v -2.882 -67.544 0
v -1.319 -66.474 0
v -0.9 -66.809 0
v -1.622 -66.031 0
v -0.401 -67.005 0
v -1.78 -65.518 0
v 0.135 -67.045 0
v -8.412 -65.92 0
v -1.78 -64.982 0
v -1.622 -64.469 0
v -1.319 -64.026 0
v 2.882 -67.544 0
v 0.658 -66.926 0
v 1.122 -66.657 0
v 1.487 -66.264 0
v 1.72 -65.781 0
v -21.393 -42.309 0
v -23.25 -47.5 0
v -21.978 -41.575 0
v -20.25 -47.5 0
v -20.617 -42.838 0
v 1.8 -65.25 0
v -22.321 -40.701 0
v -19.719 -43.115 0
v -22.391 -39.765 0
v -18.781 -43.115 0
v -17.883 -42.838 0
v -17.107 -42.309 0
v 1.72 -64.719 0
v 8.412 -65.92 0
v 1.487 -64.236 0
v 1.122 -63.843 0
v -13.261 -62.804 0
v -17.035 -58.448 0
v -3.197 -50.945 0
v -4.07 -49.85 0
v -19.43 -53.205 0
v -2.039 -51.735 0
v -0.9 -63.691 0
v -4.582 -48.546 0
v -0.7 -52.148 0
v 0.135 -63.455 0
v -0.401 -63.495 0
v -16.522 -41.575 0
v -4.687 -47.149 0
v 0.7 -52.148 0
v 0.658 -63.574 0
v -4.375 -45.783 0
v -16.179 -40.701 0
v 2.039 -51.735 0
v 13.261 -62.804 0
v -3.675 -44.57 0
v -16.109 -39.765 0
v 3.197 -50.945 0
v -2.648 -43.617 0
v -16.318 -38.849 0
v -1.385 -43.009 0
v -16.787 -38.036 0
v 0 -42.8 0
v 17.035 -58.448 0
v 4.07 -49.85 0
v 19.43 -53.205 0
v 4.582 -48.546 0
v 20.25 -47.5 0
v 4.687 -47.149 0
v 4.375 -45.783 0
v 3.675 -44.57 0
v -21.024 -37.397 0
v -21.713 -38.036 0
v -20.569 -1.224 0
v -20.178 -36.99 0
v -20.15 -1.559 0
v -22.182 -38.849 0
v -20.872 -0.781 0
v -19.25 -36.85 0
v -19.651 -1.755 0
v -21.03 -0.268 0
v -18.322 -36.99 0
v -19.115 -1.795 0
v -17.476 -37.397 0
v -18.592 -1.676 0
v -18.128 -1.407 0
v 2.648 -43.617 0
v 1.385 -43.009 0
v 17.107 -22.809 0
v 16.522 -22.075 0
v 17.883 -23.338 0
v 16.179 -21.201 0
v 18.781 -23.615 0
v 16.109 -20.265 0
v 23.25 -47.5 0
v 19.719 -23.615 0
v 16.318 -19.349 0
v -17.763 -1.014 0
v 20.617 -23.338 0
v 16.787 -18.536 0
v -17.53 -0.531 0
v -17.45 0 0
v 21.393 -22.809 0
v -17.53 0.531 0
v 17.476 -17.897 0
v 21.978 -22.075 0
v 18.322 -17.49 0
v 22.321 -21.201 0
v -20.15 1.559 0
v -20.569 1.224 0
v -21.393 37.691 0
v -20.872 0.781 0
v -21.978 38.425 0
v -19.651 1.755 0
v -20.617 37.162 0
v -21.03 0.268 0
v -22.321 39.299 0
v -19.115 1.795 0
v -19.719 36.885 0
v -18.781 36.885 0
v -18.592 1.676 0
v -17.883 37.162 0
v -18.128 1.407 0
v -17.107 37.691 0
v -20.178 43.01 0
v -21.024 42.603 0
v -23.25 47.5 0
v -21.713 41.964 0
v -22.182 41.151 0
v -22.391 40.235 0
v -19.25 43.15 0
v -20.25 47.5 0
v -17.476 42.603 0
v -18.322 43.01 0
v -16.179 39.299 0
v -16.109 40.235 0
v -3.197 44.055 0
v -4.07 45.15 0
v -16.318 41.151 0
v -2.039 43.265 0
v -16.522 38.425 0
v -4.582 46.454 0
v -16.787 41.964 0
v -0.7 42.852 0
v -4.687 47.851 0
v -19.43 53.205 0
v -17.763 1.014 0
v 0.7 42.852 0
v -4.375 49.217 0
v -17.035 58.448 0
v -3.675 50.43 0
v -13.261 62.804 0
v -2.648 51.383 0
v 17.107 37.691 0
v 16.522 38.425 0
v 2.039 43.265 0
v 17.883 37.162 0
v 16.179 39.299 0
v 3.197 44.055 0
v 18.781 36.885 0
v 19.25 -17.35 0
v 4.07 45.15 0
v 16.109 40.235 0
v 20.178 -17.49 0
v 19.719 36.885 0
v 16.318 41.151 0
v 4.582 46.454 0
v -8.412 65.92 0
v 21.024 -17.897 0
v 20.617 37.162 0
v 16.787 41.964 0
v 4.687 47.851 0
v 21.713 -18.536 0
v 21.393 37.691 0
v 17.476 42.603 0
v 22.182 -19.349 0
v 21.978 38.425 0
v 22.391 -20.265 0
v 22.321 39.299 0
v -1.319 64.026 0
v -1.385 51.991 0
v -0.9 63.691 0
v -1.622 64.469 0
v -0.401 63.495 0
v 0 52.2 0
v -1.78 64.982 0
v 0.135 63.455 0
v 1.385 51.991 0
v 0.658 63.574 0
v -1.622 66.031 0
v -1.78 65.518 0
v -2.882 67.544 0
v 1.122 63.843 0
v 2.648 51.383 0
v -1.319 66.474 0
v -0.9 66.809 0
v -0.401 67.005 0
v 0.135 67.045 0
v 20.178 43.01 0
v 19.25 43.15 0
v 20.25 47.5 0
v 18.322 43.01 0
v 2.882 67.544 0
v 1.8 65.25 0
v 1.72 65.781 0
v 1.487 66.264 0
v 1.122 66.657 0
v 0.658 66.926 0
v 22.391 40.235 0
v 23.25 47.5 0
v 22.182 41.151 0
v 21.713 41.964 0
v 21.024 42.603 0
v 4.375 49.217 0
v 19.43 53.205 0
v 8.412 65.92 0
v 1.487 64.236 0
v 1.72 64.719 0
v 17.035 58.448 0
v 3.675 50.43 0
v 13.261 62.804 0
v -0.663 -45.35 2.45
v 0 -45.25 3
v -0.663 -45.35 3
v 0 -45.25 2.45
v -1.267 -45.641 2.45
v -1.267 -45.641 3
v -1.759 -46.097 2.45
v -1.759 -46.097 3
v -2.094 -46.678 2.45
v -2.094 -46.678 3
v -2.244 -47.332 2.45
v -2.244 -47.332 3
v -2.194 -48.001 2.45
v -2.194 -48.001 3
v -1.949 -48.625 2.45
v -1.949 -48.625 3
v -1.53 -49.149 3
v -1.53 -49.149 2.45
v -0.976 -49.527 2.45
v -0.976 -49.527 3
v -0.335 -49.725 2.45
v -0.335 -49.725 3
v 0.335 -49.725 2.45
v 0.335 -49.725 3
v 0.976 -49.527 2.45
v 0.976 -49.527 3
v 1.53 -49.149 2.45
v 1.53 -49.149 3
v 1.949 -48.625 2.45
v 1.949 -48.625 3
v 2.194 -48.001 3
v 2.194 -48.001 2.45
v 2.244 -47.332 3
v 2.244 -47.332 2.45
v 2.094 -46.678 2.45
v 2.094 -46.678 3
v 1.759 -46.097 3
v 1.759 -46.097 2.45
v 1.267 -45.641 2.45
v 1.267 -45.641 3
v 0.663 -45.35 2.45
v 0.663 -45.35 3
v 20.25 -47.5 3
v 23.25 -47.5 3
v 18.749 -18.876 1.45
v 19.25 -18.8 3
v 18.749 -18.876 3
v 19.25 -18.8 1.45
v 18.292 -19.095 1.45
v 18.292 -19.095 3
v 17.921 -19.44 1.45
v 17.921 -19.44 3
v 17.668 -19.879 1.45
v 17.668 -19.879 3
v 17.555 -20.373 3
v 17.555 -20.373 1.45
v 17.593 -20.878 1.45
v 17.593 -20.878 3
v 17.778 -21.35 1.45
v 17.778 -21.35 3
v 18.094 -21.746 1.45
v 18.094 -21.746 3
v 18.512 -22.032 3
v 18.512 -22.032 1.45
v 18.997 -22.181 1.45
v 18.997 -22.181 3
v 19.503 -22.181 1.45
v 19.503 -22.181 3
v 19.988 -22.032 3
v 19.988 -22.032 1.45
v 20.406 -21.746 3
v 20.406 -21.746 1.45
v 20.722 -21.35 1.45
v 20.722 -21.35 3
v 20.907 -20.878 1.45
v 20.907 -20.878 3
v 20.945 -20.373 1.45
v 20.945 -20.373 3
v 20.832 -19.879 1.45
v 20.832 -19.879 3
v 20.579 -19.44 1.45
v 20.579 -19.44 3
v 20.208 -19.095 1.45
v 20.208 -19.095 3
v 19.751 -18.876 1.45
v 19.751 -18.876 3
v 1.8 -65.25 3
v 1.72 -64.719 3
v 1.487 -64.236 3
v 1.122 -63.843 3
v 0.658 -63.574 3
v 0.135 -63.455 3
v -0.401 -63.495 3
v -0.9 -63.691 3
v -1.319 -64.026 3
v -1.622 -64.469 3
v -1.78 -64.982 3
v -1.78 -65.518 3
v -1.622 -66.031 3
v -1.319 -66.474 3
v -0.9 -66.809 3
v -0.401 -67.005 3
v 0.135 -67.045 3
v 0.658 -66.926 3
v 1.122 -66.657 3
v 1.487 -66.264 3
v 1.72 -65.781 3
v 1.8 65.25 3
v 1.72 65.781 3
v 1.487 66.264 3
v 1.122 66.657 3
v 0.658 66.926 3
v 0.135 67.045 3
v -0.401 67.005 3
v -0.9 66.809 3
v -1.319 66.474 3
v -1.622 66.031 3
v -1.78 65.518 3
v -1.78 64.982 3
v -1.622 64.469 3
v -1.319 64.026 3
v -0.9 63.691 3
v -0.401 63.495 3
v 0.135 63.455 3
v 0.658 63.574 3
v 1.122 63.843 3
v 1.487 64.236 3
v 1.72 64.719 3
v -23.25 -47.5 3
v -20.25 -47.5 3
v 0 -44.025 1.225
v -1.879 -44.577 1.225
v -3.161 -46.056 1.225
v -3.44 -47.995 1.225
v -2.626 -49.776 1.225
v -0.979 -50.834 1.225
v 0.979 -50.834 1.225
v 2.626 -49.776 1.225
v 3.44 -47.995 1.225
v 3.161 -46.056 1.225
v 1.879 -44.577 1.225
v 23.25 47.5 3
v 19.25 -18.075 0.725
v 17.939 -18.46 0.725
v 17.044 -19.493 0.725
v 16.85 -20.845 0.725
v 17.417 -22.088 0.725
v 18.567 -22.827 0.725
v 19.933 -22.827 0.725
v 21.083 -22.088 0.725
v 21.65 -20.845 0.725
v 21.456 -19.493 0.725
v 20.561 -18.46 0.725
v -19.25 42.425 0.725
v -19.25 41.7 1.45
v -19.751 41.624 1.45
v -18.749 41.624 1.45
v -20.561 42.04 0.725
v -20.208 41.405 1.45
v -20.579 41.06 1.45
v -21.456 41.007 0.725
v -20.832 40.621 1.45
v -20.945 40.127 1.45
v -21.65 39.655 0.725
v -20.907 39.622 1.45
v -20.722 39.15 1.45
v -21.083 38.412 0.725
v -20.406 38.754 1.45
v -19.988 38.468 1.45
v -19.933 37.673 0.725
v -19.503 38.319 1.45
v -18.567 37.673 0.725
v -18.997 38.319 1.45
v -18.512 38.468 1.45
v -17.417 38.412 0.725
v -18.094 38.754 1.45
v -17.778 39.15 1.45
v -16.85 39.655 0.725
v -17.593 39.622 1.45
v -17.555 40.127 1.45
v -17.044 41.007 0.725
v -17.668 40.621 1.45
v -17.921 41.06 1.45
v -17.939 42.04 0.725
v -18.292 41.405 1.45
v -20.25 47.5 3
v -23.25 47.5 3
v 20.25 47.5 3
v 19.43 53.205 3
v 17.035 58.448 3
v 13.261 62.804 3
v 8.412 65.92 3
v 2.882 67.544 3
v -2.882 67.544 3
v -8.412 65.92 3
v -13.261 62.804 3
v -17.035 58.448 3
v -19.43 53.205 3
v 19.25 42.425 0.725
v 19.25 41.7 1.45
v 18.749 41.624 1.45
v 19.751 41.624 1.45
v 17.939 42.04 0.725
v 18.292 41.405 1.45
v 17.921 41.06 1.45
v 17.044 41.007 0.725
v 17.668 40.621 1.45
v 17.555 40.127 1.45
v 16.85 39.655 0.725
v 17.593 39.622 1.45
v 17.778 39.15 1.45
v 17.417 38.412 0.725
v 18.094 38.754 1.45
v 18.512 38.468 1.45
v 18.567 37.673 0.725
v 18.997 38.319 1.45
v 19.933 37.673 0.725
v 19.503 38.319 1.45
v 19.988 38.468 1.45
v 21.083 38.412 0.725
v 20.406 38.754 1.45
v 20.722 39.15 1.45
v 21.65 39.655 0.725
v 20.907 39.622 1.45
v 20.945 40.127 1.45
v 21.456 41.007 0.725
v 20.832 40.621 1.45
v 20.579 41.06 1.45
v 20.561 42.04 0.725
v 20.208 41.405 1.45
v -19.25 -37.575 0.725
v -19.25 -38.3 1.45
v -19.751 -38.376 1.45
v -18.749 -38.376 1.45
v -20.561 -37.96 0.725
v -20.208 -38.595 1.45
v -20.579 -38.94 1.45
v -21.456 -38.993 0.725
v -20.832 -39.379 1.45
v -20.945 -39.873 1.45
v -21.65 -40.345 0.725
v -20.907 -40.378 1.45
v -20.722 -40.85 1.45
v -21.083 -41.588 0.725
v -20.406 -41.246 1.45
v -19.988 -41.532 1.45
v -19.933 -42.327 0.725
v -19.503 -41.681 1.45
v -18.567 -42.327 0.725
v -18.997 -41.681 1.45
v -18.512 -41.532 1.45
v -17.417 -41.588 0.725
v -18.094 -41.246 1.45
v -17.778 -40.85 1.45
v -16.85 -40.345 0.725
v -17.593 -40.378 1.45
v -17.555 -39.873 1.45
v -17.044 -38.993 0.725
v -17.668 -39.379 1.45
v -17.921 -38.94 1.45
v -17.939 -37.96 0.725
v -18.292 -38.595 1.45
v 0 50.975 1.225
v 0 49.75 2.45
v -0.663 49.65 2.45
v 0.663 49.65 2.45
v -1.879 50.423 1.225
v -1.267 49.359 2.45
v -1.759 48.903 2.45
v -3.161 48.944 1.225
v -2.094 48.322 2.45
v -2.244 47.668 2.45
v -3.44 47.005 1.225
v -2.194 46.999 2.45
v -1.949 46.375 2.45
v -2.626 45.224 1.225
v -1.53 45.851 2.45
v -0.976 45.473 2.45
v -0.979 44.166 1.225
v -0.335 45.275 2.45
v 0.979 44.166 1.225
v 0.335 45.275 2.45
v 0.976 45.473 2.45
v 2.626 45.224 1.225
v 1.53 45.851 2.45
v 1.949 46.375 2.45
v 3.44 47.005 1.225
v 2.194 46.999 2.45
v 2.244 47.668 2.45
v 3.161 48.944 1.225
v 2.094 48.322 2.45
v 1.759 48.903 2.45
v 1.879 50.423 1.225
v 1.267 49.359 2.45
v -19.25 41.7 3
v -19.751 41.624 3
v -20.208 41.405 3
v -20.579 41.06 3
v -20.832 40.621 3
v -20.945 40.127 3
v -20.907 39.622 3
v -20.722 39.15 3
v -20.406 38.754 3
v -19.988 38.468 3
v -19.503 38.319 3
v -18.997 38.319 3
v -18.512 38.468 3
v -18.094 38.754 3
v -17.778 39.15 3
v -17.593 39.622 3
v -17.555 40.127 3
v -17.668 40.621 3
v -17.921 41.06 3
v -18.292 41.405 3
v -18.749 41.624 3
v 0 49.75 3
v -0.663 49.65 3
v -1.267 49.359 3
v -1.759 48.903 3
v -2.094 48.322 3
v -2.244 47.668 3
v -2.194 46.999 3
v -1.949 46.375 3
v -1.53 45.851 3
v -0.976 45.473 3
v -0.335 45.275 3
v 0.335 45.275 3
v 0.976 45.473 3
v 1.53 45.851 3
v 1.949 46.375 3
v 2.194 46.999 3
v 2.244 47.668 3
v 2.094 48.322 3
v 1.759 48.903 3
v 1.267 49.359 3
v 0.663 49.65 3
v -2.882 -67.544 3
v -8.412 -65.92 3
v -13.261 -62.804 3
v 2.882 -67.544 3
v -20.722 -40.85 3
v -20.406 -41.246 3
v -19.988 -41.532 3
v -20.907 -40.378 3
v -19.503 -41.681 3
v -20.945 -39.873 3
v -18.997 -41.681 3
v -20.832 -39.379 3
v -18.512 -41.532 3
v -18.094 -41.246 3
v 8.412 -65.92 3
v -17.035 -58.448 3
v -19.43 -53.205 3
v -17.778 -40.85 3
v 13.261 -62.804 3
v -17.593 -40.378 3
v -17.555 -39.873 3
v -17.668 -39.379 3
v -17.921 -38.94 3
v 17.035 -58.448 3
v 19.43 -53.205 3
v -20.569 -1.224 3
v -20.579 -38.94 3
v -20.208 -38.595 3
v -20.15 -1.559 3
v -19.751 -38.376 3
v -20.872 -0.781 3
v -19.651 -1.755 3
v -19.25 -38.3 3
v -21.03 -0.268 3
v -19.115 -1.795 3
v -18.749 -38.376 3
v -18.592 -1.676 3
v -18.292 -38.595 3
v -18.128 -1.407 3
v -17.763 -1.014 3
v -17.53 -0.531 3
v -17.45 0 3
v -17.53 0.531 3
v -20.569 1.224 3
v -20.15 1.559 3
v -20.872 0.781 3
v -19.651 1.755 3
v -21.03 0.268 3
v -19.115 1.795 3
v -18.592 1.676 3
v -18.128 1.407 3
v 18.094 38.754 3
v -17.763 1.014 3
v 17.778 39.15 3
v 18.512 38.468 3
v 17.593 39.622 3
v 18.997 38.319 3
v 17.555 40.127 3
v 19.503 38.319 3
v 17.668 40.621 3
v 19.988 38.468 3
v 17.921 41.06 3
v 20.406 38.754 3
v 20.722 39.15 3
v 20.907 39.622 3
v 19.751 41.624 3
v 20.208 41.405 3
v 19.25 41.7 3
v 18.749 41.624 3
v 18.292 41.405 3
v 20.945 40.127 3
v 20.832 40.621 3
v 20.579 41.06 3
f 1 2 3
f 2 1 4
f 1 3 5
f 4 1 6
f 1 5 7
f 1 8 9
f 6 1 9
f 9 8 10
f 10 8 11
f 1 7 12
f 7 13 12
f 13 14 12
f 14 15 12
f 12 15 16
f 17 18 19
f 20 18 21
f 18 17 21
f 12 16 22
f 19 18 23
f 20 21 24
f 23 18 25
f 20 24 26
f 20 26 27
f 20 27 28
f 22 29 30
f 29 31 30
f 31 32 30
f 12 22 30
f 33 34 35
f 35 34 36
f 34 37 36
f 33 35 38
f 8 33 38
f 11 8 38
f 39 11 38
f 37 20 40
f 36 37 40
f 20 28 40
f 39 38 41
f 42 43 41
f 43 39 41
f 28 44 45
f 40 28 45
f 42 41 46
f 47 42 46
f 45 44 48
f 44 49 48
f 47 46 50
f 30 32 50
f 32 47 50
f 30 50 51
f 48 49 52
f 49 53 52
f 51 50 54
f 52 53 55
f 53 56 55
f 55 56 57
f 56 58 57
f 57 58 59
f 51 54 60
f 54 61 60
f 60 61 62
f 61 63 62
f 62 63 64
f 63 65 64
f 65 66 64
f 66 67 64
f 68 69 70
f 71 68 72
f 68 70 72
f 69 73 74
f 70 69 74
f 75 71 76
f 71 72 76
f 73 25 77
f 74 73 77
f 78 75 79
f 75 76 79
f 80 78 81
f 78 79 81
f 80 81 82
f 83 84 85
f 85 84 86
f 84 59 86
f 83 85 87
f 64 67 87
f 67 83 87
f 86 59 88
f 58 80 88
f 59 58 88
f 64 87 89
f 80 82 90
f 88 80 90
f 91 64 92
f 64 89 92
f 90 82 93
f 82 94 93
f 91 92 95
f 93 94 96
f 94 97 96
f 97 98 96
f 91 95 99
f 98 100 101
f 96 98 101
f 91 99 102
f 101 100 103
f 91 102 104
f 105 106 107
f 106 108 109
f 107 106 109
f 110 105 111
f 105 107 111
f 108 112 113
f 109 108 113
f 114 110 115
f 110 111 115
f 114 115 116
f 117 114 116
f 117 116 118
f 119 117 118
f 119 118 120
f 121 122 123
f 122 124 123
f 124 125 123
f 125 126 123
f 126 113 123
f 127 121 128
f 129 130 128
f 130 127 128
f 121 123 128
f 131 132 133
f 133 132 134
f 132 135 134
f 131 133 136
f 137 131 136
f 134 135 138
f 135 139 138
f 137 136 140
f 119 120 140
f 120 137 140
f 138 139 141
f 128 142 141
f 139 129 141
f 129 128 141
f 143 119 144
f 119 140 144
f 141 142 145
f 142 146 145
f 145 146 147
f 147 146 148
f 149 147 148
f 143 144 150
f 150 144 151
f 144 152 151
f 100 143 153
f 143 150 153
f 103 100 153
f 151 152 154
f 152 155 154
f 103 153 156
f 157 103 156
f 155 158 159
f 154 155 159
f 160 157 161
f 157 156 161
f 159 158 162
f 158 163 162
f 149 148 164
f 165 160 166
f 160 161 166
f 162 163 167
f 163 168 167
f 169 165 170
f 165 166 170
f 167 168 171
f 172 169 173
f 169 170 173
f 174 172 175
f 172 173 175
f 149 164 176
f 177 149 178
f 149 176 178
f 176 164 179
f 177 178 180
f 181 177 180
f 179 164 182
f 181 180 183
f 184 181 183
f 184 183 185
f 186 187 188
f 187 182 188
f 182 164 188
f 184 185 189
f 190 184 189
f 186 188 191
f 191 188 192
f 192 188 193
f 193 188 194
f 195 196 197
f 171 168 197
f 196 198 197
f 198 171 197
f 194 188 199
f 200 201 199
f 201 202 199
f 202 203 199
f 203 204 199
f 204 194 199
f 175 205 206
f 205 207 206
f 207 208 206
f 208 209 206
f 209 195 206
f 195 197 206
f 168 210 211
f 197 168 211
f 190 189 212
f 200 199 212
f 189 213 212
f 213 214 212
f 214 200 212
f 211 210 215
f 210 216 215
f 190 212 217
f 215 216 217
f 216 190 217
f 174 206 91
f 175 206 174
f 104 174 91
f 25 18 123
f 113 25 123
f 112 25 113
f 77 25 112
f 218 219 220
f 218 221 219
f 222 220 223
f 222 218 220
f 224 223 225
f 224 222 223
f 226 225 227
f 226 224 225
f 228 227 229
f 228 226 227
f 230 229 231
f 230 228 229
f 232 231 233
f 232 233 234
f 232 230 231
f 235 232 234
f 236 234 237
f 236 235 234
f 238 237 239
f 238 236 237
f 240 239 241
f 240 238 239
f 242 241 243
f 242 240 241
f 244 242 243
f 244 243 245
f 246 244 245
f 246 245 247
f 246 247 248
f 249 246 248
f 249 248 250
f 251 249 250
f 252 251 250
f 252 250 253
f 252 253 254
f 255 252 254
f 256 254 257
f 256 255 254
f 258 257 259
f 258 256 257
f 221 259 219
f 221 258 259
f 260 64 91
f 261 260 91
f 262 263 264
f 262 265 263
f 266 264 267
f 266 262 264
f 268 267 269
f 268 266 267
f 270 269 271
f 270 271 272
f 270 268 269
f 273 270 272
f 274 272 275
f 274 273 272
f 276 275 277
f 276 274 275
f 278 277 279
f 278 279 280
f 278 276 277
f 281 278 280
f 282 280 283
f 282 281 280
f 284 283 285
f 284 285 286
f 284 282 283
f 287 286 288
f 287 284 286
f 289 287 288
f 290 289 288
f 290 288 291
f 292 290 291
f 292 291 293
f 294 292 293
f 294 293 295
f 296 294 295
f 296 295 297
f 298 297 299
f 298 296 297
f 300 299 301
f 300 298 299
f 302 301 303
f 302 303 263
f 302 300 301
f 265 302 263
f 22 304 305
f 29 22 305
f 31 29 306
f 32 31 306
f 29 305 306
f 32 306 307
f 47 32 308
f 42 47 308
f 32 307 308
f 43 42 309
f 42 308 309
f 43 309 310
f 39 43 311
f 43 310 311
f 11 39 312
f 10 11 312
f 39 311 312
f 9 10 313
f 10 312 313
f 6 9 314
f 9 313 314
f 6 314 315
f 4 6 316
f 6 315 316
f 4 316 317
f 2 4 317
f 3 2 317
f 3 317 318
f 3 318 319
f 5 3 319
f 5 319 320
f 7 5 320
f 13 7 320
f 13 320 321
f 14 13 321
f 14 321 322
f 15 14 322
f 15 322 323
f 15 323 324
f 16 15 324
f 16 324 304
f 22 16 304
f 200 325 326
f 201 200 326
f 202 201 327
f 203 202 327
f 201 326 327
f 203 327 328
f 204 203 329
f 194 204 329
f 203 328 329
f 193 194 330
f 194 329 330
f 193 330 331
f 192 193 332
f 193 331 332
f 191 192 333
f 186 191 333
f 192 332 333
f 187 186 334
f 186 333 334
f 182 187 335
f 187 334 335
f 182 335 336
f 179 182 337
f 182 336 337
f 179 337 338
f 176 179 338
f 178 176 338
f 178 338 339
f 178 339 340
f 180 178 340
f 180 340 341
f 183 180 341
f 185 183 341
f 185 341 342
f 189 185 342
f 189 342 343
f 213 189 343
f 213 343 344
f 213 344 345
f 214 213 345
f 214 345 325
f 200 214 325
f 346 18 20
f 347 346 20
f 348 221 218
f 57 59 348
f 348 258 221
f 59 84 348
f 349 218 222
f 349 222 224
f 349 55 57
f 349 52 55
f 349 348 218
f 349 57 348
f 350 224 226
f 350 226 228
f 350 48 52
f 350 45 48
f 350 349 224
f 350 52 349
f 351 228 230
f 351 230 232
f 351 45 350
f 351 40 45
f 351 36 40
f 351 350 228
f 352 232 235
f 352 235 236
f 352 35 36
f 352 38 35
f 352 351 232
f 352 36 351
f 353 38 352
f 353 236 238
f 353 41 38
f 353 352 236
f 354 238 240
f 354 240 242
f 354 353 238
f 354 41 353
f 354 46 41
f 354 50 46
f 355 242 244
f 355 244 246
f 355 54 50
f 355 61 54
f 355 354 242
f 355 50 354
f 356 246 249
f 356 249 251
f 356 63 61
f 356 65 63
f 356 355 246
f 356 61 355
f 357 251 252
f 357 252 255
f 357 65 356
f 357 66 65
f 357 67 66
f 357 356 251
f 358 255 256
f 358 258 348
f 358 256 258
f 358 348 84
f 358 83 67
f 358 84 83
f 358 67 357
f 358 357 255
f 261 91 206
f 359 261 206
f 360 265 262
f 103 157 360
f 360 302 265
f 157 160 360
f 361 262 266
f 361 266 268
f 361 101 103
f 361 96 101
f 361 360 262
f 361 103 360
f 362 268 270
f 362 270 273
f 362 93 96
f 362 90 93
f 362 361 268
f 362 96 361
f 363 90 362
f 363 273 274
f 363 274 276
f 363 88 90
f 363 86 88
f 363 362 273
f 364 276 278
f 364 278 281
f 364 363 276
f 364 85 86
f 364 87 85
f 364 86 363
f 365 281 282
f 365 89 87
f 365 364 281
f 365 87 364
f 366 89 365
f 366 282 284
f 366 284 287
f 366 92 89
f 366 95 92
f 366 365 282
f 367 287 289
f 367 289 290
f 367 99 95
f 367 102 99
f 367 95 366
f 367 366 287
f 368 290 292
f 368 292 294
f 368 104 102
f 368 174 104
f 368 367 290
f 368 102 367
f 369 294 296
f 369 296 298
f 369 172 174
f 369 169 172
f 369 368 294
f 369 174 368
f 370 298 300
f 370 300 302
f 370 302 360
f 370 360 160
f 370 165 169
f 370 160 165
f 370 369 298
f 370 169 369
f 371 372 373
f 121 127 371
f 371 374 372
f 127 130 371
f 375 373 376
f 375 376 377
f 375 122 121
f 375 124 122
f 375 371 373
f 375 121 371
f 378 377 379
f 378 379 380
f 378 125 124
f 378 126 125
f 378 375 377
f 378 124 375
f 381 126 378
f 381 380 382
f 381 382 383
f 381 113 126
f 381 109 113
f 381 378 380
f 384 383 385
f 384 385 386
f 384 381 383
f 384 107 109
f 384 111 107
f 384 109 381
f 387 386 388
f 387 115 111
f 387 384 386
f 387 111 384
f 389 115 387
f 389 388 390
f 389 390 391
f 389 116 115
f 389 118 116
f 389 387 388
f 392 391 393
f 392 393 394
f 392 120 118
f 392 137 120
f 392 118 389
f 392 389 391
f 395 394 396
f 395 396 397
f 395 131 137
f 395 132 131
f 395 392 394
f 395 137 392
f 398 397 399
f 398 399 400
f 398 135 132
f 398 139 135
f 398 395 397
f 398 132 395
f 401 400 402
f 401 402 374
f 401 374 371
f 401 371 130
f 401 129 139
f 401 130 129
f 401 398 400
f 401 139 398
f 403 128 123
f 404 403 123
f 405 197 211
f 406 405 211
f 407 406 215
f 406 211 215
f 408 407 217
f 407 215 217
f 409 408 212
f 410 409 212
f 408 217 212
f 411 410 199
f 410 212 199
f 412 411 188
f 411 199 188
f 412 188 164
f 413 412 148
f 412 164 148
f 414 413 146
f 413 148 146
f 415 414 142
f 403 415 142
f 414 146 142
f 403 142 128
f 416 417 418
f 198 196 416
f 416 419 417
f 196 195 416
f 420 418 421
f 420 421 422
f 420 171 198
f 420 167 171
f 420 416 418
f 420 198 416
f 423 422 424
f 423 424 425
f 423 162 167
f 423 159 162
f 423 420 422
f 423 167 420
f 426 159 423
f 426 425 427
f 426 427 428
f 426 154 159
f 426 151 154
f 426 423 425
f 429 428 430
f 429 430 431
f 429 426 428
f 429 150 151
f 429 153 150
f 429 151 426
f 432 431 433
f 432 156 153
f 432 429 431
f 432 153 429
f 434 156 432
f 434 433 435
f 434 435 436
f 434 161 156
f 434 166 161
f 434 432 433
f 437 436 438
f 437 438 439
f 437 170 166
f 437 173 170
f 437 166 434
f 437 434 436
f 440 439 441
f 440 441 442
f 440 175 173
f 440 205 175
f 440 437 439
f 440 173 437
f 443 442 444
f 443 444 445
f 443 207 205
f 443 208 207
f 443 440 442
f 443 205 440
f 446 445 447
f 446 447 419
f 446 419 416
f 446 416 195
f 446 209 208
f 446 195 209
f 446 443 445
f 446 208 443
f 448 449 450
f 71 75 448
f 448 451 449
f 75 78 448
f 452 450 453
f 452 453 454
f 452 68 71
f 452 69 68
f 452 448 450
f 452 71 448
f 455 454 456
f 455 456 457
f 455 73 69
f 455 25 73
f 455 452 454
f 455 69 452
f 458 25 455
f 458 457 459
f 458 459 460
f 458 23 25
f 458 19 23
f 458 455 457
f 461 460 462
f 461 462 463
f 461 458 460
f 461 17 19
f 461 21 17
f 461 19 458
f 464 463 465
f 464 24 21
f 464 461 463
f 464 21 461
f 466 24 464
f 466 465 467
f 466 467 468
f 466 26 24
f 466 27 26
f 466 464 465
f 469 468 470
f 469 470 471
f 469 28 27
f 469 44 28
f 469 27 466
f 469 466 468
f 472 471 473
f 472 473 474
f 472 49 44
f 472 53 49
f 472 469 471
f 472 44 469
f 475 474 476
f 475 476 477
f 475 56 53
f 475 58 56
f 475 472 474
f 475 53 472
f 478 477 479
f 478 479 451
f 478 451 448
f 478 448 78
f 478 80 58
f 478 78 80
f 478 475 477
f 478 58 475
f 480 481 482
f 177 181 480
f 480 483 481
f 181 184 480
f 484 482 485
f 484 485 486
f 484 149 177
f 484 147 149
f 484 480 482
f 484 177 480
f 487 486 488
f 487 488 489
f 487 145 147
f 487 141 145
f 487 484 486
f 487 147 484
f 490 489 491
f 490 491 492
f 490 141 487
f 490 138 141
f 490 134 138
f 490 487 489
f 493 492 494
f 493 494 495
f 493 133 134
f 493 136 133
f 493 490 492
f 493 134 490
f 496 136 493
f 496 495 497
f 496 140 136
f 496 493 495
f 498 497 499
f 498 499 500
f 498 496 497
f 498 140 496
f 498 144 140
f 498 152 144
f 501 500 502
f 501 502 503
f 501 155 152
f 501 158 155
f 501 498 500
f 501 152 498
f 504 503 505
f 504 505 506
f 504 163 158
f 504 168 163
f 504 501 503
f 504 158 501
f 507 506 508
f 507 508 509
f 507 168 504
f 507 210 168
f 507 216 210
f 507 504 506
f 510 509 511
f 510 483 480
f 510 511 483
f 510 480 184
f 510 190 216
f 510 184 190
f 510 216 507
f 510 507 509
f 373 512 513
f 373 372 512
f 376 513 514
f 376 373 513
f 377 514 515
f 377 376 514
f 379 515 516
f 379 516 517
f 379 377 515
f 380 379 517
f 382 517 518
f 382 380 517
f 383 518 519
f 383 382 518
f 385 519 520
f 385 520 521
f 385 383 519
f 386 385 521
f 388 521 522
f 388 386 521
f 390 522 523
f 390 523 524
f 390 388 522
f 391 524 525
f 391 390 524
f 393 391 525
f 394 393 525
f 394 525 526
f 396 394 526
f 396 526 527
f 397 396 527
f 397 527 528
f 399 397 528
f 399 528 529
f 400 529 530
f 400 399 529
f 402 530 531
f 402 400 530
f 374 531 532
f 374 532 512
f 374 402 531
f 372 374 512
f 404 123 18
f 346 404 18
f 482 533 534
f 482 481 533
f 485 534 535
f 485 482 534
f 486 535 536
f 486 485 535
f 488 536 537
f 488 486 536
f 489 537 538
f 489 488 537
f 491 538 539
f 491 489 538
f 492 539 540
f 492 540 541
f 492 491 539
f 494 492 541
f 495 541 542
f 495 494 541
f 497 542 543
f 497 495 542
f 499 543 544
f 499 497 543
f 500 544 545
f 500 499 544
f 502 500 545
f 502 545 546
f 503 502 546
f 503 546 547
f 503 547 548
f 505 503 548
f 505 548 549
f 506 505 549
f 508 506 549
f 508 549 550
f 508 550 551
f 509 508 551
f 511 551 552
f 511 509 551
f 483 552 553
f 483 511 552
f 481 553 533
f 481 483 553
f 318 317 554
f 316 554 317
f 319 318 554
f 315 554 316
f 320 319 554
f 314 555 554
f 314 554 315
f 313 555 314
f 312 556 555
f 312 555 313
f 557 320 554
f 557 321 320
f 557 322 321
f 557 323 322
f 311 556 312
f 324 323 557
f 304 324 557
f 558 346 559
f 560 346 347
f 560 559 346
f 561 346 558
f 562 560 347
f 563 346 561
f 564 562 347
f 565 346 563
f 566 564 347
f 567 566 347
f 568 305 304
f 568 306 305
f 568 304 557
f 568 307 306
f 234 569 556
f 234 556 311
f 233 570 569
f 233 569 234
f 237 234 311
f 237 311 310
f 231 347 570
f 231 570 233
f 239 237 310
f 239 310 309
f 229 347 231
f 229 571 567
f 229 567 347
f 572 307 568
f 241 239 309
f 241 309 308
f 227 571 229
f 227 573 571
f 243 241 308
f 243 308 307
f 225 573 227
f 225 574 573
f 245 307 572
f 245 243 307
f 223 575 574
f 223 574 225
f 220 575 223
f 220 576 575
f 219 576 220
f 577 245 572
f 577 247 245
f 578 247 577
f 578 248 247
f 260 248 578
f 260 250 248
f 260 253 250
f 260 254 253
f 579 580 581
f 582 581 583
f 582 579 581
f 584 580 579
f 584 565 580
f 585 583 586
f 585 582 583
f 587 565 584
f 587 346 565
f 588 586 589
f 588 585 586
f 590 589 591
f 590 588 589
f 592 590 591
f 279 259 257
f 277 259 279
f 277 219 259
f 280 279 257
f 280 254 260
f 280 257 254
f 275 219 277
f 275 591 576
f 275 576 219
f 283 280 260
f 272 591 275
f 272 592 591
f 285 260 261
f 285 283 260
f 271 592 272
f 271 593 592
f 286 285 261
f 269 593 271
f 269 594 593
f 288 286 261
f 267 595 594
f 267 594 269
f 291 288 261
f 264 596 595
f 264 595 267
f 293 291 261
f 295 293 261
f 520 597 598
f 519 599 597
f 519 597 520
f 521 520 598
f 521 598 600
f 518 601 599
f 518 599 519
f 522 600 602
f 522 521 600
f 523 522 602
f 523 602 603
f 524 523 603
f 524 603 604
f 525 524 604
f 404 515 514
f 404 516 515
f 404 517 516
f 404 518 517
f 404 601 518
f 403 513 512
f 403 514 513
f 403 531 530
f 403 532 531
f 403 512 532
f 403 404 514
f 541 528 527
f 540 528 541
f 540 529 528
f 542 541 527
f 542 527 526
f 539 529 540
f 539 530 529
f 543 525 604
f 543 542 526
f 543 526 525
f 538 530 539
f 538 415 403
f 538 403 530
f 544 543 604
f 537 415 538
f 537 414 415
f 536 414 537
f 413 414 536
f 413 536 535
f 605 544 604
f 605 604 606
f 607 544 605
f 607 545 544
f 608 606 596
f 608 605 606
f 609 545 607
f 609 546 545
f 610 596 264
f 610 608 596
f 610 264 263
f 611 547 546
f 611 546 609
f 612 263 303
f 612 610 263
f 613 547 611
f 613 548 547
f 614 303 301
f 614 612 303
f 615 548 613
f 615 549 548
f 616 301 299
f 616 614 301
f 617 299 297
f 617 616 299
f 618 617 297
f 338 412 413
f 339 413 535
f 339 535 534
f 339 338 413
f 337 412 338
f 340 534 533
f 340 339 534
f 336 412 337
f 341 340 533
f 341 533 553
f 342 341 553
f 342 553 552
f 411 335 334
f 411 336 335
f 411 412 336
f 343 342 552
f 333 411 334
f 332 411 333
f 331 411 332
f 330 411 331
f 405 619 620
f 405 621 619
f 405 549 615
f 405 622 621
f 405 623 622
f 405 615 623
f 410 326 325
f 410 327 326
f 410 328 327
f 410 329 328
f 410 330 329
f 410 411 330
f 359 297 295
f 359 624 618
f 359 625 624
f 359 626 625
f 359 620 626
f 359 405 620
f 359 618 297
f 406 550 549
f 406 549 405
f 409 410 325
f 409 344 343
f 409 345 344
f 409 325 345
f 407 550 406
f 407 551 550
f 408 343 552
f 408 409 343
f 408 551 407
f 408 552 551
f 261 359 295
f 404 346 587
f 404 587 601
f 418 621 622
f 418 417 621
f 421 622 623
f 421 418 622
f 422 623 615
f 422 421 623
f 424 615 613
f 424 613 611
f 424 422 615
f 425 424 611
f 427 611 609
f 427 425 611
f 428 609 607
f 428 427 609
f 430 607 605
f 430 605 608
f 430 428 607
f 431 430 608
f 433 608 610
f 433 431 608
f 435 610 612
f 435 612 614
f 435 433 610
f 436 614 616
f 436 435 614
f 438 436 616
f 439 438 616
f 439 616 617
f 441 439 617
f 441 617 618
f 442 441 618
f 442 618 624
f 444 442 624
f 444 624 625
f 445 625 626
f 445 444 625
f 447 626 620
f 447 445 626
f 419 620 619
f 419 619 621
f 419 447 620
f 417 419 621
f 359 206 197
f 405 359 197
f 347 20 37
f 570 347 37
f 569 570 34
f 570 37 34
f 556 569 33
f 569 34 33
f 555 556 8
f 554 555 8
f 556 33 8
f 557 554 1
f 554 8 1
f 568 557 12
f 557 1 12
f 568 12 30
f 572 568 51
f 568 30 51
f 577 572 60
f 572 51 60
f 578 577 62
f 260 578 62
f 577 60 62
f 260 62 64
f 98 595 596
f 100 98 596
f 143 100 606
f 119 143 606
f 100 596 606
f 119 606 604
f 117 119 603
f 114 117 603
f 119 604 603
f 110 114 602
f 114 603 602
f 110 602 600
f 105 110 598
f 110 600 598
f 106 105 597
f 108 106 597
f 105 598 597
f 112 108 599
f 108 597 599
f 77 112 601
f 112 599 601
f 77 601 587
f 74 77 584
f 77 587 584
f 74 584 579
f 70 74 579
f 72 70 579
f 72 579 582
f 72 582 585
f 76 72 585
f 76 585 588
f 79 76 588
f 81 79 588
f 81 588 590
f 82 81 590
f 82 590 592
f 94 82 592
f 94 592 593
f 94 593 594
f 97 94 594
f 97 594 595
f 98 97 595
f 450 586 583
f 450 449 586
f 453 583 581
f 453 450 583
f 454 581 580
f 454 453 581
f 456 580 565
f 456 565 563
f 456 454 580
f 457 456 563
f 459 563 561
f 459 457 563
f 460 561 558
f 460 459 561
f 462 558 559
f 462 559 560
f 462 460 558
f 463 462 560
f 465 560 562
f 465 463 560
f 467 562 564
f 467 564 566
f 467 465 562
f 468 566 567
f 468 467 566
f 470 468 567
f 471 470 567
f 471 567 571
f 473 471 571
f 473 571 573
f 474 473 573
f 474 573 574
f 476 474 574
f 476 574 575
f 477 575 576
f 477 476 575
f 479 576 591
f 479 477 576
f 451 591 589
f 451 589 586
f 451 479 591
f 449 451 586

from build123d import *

# Parameters (mm, degrees)
ESTRUSIONE_ESTRUSIONE1_DEPTH          = 3
FORO_SVASATO_PER_VITE_M4_1_AT_2_COUNT = 2
FORO_SVASATO_PER_VITE_M4_1_AT_2_PITCH = 95
FORO_SVASATO_PER_VITE_M3_1_AT_2_COUNT = 2
FORO_SVASATO_PER_VITE_M3_1_AT_2_PITCH = 60.5
FORO_SVASATO_PER_VITE_M3_1_AT_3_COUNT = 2
FORO_SVASATO_PER_VITE_M3_1_AT_3_PITCH = 88.782036471
FORO_SVASATO_PER_VITE_M3_1_AT_4_COUNT = 2
FORO_SVASATO_PER_VITE_M3_1_AT_4_PITCH = 38.5
M3_CLEARANCE_HOLE1_D                  = 3.6
M3_CLEARANCE_HOLE1_DEPTH              = 4
M3_CLEARANCE_HOLE1_TIP                = 1.081549114


with BuildPart() as part:
    # Schizzo1 → Estrusione-Estrusione1 (new body)
    with BuildSketch(Plane.XY):
        with BuildLine():
            Line((20.25, -47.5), (23.25, -47.5))
            Line((23.25, -47.5), (23.25, 47.5))
            Line((23.25, 47.5), (20.25, 47.5))
            ThreePointArc((20.25, 47.5), (0, 67.75), (-20.25, 47.5))
            Line((-20.25, 47.5), (-23.25, 47.5))
            Line((-23.25, 47.5), (-23.25, -47.5))
            Line((-23.25, -47.5), (-20.25, -47.5))
            ThreePointArc((-20.25, -47.5), (0, -67.75), (20.25, -47.5))
        make_face()
    extrude(amount=ESTRUSIONE_ESTRUSIONE1_DEPTH)

    # Schizzo5 → Foro svasato per Vite M4-1 (revolve, cut)
    with BuildSketch(Plane(origin=(0, 47.5, 0), x_dir=(0, 1, 0), z_dir=(1, 0, 0))):
        Polygon((0, 0), (0, 3), (2.25, 3), (2.25, 2.45), (4.7, 0), align=None)
    foro_svasato_per_vite_m4_1 = revolve(axis=Axis((0, 47.5, -6.35), (0, 0, 1)), mode=Mode.SUBTRACT)

    # Foro svasato per Vite M4-1 at 2: Foro svasato per Vite M4-1 ×2
    with Locations(*[(0, -i * FORO_SVASATO_PER_VITE_M4_1_AT_2_PITCH, 0) for i in range(1, FORO_SVASATO_PER_VITE_M4_1_AT_2_COUNT)]):
        add(foro_svasato_per_vite_m4_1, mode=Mode.SUBTRACT)

    # Schizzo8 → Foro svasato per Vite M3-1 (revolve, cut)
    with BuildSketch(Plane(origin=(19.25, 40, 0), x_dir=(0, 1, 0), z_dir=(1, 0, 0))):
        Polygon((0, 0), (0, 3), (1.7, 3), (1.7, 1.45), (3.15, 0), align=None)
    foro_svasato_per_vite_m3_1 = revolve(axis=Axis((19.25, 40, -6.35), (0, 0, 1)), mode=Mode.SUBTRACT)

    # Foro svasato per Vite M3-1 at 2: Foro svasato per Vite M3-1 ×2
    with Locations(*[(0, -i * FORO_SVASATO_PER_VITE_M3_1_AT_2_PITCH, 0) for i in range(1, FORO_SVASATO_PER_VITE_M3_1_AT_2_COUNT)]):
        add(foro_svasato_per_vite_m3_1, mode=Mode.SUBTRACT)

    # Foro svasato per Vite M3-1 at 3: Foro svasato per Vite M3-1 ×2
    with Locations(*[Vector(-0.43364628172754605, -0.9010831828104849, 0) * (i * FORO_SVASATO_PER_VITE_M3_1_AT_3_PITCH) for i in range(1, FORO_SVASATO_PER_VITE_M3_1_AT_3_COUNT)]):
        add(foro_svasato_per_vite_m3_1, mode=Mode.SUBTRACT)

    # Foro svasato per Vite M3-1 at 4: Foro svasato per Vite M3-1 ×2
    with Locations(*[(-i * FORO_SVASATO_PER_VITE_M3_1_AT_4_PITCH, 0, 0) for i in range(1, FORO_SVASATO_PER_VITE_M3_1_AT_4_COUNT)]):
        add(foro_svasato_per_vite_m3_1, mode=Mode.SUBTRACT)

    # M3 Clearance Hole1
    with Locations(Plane(origin=(0, 0, 0), x_dir=(-1, 0, 0), z_dir=(0, 0, -1))):
        with Locations((19.25, 0), (0, 65.25), (0, -65.25)):
            Hole(M3_CLEARANCE_HOLE1_D / 2, depth=M3_CLEARANCE_HOLE1_DEPTH)
            with Locations((0, 0, -(M3_CLEARANCE_HOLE1_DEPTH + M3_CLEARANCE_HOLE1_TIP / 2))):  # 118° drill point
                Cone(0, M3_CLEARANCE_HOLE1_D / 2, M3_CLEARANCE_HOLE1_TIP, mode=Mode.SUBTRACT)


solid = part.part
